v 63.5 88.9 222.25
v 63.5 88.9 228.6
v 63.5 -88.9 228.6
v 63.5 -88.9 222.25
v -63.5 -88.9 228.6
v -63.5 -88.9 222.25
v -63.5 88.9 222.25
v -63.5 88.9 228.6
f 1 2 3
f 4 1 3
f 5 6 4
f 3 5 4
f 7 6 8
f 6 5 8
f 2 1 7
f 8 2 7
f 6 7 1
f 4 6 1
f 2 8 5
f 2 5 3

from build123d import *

# Parameters (mm, degrees)
F1_DEPTH  = 228.6
F2_R      = 6.35
F3_DEPTH  = 76.2
F2_R_2    = 0.0318822677
F4_DEPTH  = 177.8
F5_DEPTH  = 203.2
F18_W     = 457.1923286208
F18_H     = 234.95
F19_DEPTH = 254
F21_DEPTH = 254
F22_DEPTH = 254


with BuildPart() as f1:
    # F0 (on Top) → F1 (new body)
    with BuildSketch(Plane.XY):
        Polygon((-190.5, 0), (-176.9553790345, 11.8515433448), (-190.5, 25.3961643104), (-215.8961643104, 0), (-190.5, -25.3961643104), (-176.9553790345, -11.8515433448), align=None)
        Polygon((-165.1038356896, 0), (-176.9553790345, 11.8515433448), (-190.5, 0), (-176.9553790345, -11.8515433448), align=None)
        Polygon((-88.9, 0), (-88.9, 63.5), (-102.4466666667, 77.0466666667), (-176.9553790345, 11.8515433448), (-165.1038356896, 0), (-176.9553790345, -11.8515433448), (-102.4466666667, -77.0466666667), (-88.9, -63.5), align=None)
        Polygon((-88.9, 63.5), (-63.5, 88.9), (-88.9, 114.3), (-114.3, 88.9), (-102.4466666667, 77.0466666667), align=None)
        Polygon((-63.5, -88.9), (-88.9, -63.5), (-102.4466666667, -77.0466666667), (-114.3, -88.9), (-88.9, -114.3), align=None)
        Polygon((102.4466666667, -77.0466666667), (88.9, -63.5), (63.5, -88.9), (88.9, -114.3), (114.3, -88.9), align=None)
        Polygon((102.4466666667, 77.0466666667), (88.9, 63.5), (88.9, 0), (88.9, -63.5), (102.4466666667, -77.0466666667), (176.9553790345, -11.8515433448), (165.1038356896, 0), (176.9553790345, 11.8515433448), align=None)
        Polygon((63.5, 88.9), (0, 88.9), (-63.5, 88.9), (-88.9, 63.5), (-88.9, 0), (-88.9, -63.5), (-63.5, -88.9), (0, -88.9), (63.5, -88.9), (88.9, -63.5), (88.9, 0), (88.9, 63.5), align=None)
        Polygon((88.9, 114.3), (63.5, 88.9), (88.9, 63.5), (102.4466666667, 77.0466666667), (114.3, 88.9), align=None)
        Polygon((190.5, 25.3961643104), (176.9553790345, 11.8515433448), (190.5, 0), (176.9553790345, -11.8515433448), (190.5, -25.3961643104), (215.8961643104, 0), align=None)
        Polygon((190.5, 0), (176.9553790345, 11.8515433448), (165.1038356896, 0), (176.9553790345, -11.8515433448), align=None)
    extrude(amount=F1_DEPTH)

    # F2 (on face) → F3 (join)
    with BuildSketch(Plane.XY.offset(228.6)):
        Polygon((-177.8019178448, 0), (-190.5, 12.6980821552), (-203.1980821552, 0), (-190.5, -12.6980821552), align=None)
        with Locations((-190.5, 0)):
            Circle(F2_R, mode=Mode.SUBTRACT)
        Polygon((-88.9, 101.6), (-101.6, 88.9), (-88.9, 76.2), (-76.2, 88.9), align=None)
        with Locations((-88.9, 88.8576358557)):
            Circle(F2_R, mode=Mode.SUBTRACT)
        Polygon((190.5, -12.6980821552), (203.1980821552, 0), (190.5, 12.6980821552), (177.8019178448, 0), align=None)
        with Locations((190.5, 0)):
            Circle(F2_R, mode=Mode.SUBTRACT)
        Polygon((88.9, -101.6), (101.6, -88.9), (88.9, -76.2), (76.2, -88.9), align=None)
        with Locations((88.9, -88.8576358557)):
            Circle(F2_R, mode=Mode.SUBTRACT)
        Polygon((-101.6, -88.9), (-88.9, -101.6), (-76.2, -88.9), (-88.9, -76.2), align=None)
        with Locations((-88.9, -88.8576358557)):
            Circle(F2_R, mode=Mode.SUBTRACT)
        Polygon((101.6, 88.9), (88.9, 101.6), (76.2, 88.9), (88.9, 76.2), align=None)
        with Locations((88.9, 88.8576358557)):
            Circle(F2_R, mode=Mode.SUBTRACT)
    extrude(amount=F3_DEPTH)

    # F2 (on face) → F4 (join)
    with BuildSketch(Plane.XY.offset(228.6)):
        with Locations((-88.9, 88.8576358557)):
            Circle(F2_R)
        with Locations((-88.9, 88.8576358557)):
            Circle(F2_R_2, mode=Mode.SUBTRACT)
        with Locations((190.5, 0)):
            Circle(F2_R)
        with Locations((-88.9, -88.8576358557)):
            Circle(F2_R)
        with Locations((-88.9, -88.8576358557)):
            Circle(F2_R_2, mode=Mode.SUBTRACT)
        with Locations((88.9, -88.8576358557)):
            Circle(F2_R)
        with Locations((88.9, -88.8576358557)):
            Circle(F2_R_2, mode=Mode.SUBTRACT)
        with Locations((88.9, 88.8576358557)):
            Circle(F2_R)
        with Locations((88.9, 88.8576358557)):
            Circle(F2_R_2, mode=Mode.SUBTRACT)
    extrude(amount=F4_DEPTH)

    # F2 (on face) → F5 (join)
    with BuildSketch(Plane.XY.offset(228.6)):
        with Locations((-190.5, 0)):
            Circle(F2_R)
    extrude(amount=F5_DEPTH)

    # F6 (on face) → F7 (revolve, cut)
    with BuildSketch(Plane.XZ.offset(88.9)):
        Polygon((-88.8746, 406.4), (-82.4992, 304.8), (-82.4992, 406.4), align=None)
    revolve(axis=Axis((-88.9, -88.9, 355.6), (0, 0, 1)), mode=Mode.SUBTRACT)

    # F8 (on face) → F9 (revolve, cut)
    with BuildSketch(Plane.XZ.offset(88.9)):
        Polygon((88.9258086681, 406.4), (95.3012086681, 304.8), (95.3012086681, 406.4), align=None)
    revolve(axis=Axis((88.9004086681, -88.9, 355.6), (0, 0, 1)), mode=Mode.SUBTRACT)

    # F10 (on face) → F11 (revolve, cut)
    with BuildSketch(Plane(origin=(0, 88.9, 0), x_dir=(-1, 0, 0), z_dir=(0, 1, 0))):
        Polygon((88.9252200723, 406.4), (95.3006200723, 304.8), (95.3006200723, 406.4), align=None)
    revolve(axis=Axis((-88.8998200723, 88.9, 355.6), (0, 0, 1)), mode=Mode.SUBTRACT)

    # F12 (on face) → F13 (revolve, cut)
    with BuildSketch(Plane(origin=(0, 88.9, 0), x_dir=(-1, 0, 0), z_dir=(0, 1, 0))):
        Polygon((-88.873654604, 406.4), (-82.498254604, 304.8), (-82.498254604, 406.4), align=None)
    revolve(axis=Axis((88.899054604, 88.9, 355.6), (0, 0, 1)), mode=Mode.SUBTRACT)

    # F14 (on face) → F15 (revolve, cut)
    with BuildSketch(Plane(origin=(82.6061946903, 94.407079646, 0), x_dir=(-0.7525766947, 0.6585046079, 0), z_dir=(0.6585046079, 0.7525766947, 0))):
        Polygon((-143.3982827, 406.4), (-136.9974827, 304.8), (-136.9974827, 406.4), align=None)
    revolve(axis=Axis((190.5435157593, -0.0380762894, 355.6), (0, 0, 1)), mode=Mode.SUBTRACT)

    # F16 (on face) → F17 (revolve, cut)
    with BuildSketch(Plane(origin=(-82.6061946903, -94.407079646, 0), x_dir=(0.7525766947, -0.6585046079, 0), z_dir=(-0.6585046079, -0.7525766947, 0))):
        Polygon((-143.3958336711, 431.8), (-136.9950336711, 304.8), (-136.9950336711, 431.8), align=None)
    revolve(axis=Axis((-190.5416726772, 0.0364635926, 368.3), (0, 0, 1)), mode=Mode.SUBTRACT)

    # F18 (on Front) → F19 (cut, symmetric)
    with BuildSketch(Plane.XZ):
        with Locations((0, 104.775)):
            Rectangle(F18_W, F18_H)
    extrude(amount=F19_DEPTH, both=True, mode=Mode.SUBTRACT)

    # F20 (on face) → F21 (cut, symmetric)
    with BuildSketch(Plane.XY.offset(228.6)):
        Polygon((-63.5, -88.9), (-63.5, 88.9), (-88.9, 114.3), (-114.3, 88.9), (-102.4466666667, 77.0466666667), (-176.9553790345, 11.8515433448), (-190.5, 25.3961643104), (-215.8961643104, 0), (-190.5, -25.3961643104), (-176.9553790345, -11.8515433448), (-102.4466666667, -77.0466666667), (-114.3, -88.9), (-88.9, -114.3), align=None)
        Polygon((-76.2, -88.9), (-88.9, -101.6), (-101.6, -88.9), (-88.9, -76.2), align=None, mode=Mode.SUBTRACT)
        Polygon((-190.5, -12.6980821552), (-203.1980821552, 0), (-190.5, 12.6980821552), (-177.8019178448, 0), align=None, mode=Mode.SUBTRACT)
        Polygon((-88.9, 76.2), (-101.6, 88.9), (-88.9, 101.6), (-76.2, 88.9), align=None, mode=Mode.SUBTRACT)
        Polygon((-88.9, 101.6), (-101.6, 88.9), (-88.9, 76.2), (-76.2, 88.9), align=None)
        Polygon((-190.5, 12.6980821552), (-203.1980821552, 0), (-190.5, -12.6980821552), (-177.8019178448, 0), align=None)
        Polygon((-101.6, -88.9), (-88.9, -101.6), (-76.2, -88.9), (-88.9, -76.2), align=None)
        Polygon((-88.9, 114.3), (-63.5, 88.9), (-63.5, 130.1615387201), (-229.1453778744, 130.1615387201), (-229.1453778744, -150.0742584467), (-63.5, -150.0742584467), (-63.5, -88.9), (-88.9, -114.3), (-114.3, -88.9), (-102.4466666667, -77.0466666667), (-176.9553790345, -11.8515433448), (-190.5, -25.3961643104), (-215.8961643104, 0), (-190.5, 25.3961643104), (-176.9553790345, 11.8515433448), (-102.4466666667, 77.0466666667), (-114.3, 88.9), align=None)
    extrude(amount=F21_DEPTH, both=True, mode=Mode.SUBTRACT)

    # F20 (on face) → F22 (cut, symmetric)
    with BuildSketch(Plane.XY.offset(228.6)):
        Polygon((88.9, 114.3), (63.5, 88.9), (63.5, -88.9), (88.9, -114.3), (114.3, -88.9), (102.4466666667, -77.0466666667), (176.9553790345, -11.8515433448), (190.5, -25.3961643104), (215.8961643104, 0), (190.5, 25.3961643104), (176.9553790345, 11.8515433448), (102.4466666667, 77.0466666667), (114.3, 88.9), align=None)
        Polygon((88.9, -76.2), (101.6, -88.9), (88.9, -101.6), (76.2, -88.9), align=None, mode=Mode.SUBTRACT)
        Polygon((190.5, -12.6980821552), (177.8019178448, 0), (190.5, 12.6980821552), (203.1980821552, 0), align=None, mode=Mode.SUBTRACT)
        Polygon((76.2, 88.9), (88.9, 101.6), (101.6, 88.9), (88.9, 76.2), align=None, mode=Mode.SUBTRACT)
        Polygon((101.6, 88.9), (88.9, 101.6), (76.2, 88.9), (88.9, 76.2), align=None)
        Polygon((246.9839304686, 138.0399912596), (63.5, 138.0399912596), (63.5, 88.9), (88.9, 114.3), (114.3, 88.9), (102.4466666667, 77.0466666667), (176.9553790345, 11.8515433448), (190.5, 25.3961643104), (215.8961643104, 0), (190.5, -25.3961643104), (176.9553790345, -11.8515433448), (102.4466666667, -77.0466666667), (114.3, -88.9), (88.9, -114.3), (63.5, -88.9), (63.5, -133.0628693104), (246.9839304686, -133.0628693104), align=None)
        Polygon((190.5, 12.6980821552), (177.8019178448, 0), (190.5, -12.6980821552), (203.1980821552, 0), align=None)
        Polygon((88.9, -101.6), (101.6, -88.9), (88.9, -76.2), (76.2, -88.9), align=None)
    extrude(amount=F22_DEPTH, both=True, mode=Mode.SUBTRACT)


solid = f1.part
